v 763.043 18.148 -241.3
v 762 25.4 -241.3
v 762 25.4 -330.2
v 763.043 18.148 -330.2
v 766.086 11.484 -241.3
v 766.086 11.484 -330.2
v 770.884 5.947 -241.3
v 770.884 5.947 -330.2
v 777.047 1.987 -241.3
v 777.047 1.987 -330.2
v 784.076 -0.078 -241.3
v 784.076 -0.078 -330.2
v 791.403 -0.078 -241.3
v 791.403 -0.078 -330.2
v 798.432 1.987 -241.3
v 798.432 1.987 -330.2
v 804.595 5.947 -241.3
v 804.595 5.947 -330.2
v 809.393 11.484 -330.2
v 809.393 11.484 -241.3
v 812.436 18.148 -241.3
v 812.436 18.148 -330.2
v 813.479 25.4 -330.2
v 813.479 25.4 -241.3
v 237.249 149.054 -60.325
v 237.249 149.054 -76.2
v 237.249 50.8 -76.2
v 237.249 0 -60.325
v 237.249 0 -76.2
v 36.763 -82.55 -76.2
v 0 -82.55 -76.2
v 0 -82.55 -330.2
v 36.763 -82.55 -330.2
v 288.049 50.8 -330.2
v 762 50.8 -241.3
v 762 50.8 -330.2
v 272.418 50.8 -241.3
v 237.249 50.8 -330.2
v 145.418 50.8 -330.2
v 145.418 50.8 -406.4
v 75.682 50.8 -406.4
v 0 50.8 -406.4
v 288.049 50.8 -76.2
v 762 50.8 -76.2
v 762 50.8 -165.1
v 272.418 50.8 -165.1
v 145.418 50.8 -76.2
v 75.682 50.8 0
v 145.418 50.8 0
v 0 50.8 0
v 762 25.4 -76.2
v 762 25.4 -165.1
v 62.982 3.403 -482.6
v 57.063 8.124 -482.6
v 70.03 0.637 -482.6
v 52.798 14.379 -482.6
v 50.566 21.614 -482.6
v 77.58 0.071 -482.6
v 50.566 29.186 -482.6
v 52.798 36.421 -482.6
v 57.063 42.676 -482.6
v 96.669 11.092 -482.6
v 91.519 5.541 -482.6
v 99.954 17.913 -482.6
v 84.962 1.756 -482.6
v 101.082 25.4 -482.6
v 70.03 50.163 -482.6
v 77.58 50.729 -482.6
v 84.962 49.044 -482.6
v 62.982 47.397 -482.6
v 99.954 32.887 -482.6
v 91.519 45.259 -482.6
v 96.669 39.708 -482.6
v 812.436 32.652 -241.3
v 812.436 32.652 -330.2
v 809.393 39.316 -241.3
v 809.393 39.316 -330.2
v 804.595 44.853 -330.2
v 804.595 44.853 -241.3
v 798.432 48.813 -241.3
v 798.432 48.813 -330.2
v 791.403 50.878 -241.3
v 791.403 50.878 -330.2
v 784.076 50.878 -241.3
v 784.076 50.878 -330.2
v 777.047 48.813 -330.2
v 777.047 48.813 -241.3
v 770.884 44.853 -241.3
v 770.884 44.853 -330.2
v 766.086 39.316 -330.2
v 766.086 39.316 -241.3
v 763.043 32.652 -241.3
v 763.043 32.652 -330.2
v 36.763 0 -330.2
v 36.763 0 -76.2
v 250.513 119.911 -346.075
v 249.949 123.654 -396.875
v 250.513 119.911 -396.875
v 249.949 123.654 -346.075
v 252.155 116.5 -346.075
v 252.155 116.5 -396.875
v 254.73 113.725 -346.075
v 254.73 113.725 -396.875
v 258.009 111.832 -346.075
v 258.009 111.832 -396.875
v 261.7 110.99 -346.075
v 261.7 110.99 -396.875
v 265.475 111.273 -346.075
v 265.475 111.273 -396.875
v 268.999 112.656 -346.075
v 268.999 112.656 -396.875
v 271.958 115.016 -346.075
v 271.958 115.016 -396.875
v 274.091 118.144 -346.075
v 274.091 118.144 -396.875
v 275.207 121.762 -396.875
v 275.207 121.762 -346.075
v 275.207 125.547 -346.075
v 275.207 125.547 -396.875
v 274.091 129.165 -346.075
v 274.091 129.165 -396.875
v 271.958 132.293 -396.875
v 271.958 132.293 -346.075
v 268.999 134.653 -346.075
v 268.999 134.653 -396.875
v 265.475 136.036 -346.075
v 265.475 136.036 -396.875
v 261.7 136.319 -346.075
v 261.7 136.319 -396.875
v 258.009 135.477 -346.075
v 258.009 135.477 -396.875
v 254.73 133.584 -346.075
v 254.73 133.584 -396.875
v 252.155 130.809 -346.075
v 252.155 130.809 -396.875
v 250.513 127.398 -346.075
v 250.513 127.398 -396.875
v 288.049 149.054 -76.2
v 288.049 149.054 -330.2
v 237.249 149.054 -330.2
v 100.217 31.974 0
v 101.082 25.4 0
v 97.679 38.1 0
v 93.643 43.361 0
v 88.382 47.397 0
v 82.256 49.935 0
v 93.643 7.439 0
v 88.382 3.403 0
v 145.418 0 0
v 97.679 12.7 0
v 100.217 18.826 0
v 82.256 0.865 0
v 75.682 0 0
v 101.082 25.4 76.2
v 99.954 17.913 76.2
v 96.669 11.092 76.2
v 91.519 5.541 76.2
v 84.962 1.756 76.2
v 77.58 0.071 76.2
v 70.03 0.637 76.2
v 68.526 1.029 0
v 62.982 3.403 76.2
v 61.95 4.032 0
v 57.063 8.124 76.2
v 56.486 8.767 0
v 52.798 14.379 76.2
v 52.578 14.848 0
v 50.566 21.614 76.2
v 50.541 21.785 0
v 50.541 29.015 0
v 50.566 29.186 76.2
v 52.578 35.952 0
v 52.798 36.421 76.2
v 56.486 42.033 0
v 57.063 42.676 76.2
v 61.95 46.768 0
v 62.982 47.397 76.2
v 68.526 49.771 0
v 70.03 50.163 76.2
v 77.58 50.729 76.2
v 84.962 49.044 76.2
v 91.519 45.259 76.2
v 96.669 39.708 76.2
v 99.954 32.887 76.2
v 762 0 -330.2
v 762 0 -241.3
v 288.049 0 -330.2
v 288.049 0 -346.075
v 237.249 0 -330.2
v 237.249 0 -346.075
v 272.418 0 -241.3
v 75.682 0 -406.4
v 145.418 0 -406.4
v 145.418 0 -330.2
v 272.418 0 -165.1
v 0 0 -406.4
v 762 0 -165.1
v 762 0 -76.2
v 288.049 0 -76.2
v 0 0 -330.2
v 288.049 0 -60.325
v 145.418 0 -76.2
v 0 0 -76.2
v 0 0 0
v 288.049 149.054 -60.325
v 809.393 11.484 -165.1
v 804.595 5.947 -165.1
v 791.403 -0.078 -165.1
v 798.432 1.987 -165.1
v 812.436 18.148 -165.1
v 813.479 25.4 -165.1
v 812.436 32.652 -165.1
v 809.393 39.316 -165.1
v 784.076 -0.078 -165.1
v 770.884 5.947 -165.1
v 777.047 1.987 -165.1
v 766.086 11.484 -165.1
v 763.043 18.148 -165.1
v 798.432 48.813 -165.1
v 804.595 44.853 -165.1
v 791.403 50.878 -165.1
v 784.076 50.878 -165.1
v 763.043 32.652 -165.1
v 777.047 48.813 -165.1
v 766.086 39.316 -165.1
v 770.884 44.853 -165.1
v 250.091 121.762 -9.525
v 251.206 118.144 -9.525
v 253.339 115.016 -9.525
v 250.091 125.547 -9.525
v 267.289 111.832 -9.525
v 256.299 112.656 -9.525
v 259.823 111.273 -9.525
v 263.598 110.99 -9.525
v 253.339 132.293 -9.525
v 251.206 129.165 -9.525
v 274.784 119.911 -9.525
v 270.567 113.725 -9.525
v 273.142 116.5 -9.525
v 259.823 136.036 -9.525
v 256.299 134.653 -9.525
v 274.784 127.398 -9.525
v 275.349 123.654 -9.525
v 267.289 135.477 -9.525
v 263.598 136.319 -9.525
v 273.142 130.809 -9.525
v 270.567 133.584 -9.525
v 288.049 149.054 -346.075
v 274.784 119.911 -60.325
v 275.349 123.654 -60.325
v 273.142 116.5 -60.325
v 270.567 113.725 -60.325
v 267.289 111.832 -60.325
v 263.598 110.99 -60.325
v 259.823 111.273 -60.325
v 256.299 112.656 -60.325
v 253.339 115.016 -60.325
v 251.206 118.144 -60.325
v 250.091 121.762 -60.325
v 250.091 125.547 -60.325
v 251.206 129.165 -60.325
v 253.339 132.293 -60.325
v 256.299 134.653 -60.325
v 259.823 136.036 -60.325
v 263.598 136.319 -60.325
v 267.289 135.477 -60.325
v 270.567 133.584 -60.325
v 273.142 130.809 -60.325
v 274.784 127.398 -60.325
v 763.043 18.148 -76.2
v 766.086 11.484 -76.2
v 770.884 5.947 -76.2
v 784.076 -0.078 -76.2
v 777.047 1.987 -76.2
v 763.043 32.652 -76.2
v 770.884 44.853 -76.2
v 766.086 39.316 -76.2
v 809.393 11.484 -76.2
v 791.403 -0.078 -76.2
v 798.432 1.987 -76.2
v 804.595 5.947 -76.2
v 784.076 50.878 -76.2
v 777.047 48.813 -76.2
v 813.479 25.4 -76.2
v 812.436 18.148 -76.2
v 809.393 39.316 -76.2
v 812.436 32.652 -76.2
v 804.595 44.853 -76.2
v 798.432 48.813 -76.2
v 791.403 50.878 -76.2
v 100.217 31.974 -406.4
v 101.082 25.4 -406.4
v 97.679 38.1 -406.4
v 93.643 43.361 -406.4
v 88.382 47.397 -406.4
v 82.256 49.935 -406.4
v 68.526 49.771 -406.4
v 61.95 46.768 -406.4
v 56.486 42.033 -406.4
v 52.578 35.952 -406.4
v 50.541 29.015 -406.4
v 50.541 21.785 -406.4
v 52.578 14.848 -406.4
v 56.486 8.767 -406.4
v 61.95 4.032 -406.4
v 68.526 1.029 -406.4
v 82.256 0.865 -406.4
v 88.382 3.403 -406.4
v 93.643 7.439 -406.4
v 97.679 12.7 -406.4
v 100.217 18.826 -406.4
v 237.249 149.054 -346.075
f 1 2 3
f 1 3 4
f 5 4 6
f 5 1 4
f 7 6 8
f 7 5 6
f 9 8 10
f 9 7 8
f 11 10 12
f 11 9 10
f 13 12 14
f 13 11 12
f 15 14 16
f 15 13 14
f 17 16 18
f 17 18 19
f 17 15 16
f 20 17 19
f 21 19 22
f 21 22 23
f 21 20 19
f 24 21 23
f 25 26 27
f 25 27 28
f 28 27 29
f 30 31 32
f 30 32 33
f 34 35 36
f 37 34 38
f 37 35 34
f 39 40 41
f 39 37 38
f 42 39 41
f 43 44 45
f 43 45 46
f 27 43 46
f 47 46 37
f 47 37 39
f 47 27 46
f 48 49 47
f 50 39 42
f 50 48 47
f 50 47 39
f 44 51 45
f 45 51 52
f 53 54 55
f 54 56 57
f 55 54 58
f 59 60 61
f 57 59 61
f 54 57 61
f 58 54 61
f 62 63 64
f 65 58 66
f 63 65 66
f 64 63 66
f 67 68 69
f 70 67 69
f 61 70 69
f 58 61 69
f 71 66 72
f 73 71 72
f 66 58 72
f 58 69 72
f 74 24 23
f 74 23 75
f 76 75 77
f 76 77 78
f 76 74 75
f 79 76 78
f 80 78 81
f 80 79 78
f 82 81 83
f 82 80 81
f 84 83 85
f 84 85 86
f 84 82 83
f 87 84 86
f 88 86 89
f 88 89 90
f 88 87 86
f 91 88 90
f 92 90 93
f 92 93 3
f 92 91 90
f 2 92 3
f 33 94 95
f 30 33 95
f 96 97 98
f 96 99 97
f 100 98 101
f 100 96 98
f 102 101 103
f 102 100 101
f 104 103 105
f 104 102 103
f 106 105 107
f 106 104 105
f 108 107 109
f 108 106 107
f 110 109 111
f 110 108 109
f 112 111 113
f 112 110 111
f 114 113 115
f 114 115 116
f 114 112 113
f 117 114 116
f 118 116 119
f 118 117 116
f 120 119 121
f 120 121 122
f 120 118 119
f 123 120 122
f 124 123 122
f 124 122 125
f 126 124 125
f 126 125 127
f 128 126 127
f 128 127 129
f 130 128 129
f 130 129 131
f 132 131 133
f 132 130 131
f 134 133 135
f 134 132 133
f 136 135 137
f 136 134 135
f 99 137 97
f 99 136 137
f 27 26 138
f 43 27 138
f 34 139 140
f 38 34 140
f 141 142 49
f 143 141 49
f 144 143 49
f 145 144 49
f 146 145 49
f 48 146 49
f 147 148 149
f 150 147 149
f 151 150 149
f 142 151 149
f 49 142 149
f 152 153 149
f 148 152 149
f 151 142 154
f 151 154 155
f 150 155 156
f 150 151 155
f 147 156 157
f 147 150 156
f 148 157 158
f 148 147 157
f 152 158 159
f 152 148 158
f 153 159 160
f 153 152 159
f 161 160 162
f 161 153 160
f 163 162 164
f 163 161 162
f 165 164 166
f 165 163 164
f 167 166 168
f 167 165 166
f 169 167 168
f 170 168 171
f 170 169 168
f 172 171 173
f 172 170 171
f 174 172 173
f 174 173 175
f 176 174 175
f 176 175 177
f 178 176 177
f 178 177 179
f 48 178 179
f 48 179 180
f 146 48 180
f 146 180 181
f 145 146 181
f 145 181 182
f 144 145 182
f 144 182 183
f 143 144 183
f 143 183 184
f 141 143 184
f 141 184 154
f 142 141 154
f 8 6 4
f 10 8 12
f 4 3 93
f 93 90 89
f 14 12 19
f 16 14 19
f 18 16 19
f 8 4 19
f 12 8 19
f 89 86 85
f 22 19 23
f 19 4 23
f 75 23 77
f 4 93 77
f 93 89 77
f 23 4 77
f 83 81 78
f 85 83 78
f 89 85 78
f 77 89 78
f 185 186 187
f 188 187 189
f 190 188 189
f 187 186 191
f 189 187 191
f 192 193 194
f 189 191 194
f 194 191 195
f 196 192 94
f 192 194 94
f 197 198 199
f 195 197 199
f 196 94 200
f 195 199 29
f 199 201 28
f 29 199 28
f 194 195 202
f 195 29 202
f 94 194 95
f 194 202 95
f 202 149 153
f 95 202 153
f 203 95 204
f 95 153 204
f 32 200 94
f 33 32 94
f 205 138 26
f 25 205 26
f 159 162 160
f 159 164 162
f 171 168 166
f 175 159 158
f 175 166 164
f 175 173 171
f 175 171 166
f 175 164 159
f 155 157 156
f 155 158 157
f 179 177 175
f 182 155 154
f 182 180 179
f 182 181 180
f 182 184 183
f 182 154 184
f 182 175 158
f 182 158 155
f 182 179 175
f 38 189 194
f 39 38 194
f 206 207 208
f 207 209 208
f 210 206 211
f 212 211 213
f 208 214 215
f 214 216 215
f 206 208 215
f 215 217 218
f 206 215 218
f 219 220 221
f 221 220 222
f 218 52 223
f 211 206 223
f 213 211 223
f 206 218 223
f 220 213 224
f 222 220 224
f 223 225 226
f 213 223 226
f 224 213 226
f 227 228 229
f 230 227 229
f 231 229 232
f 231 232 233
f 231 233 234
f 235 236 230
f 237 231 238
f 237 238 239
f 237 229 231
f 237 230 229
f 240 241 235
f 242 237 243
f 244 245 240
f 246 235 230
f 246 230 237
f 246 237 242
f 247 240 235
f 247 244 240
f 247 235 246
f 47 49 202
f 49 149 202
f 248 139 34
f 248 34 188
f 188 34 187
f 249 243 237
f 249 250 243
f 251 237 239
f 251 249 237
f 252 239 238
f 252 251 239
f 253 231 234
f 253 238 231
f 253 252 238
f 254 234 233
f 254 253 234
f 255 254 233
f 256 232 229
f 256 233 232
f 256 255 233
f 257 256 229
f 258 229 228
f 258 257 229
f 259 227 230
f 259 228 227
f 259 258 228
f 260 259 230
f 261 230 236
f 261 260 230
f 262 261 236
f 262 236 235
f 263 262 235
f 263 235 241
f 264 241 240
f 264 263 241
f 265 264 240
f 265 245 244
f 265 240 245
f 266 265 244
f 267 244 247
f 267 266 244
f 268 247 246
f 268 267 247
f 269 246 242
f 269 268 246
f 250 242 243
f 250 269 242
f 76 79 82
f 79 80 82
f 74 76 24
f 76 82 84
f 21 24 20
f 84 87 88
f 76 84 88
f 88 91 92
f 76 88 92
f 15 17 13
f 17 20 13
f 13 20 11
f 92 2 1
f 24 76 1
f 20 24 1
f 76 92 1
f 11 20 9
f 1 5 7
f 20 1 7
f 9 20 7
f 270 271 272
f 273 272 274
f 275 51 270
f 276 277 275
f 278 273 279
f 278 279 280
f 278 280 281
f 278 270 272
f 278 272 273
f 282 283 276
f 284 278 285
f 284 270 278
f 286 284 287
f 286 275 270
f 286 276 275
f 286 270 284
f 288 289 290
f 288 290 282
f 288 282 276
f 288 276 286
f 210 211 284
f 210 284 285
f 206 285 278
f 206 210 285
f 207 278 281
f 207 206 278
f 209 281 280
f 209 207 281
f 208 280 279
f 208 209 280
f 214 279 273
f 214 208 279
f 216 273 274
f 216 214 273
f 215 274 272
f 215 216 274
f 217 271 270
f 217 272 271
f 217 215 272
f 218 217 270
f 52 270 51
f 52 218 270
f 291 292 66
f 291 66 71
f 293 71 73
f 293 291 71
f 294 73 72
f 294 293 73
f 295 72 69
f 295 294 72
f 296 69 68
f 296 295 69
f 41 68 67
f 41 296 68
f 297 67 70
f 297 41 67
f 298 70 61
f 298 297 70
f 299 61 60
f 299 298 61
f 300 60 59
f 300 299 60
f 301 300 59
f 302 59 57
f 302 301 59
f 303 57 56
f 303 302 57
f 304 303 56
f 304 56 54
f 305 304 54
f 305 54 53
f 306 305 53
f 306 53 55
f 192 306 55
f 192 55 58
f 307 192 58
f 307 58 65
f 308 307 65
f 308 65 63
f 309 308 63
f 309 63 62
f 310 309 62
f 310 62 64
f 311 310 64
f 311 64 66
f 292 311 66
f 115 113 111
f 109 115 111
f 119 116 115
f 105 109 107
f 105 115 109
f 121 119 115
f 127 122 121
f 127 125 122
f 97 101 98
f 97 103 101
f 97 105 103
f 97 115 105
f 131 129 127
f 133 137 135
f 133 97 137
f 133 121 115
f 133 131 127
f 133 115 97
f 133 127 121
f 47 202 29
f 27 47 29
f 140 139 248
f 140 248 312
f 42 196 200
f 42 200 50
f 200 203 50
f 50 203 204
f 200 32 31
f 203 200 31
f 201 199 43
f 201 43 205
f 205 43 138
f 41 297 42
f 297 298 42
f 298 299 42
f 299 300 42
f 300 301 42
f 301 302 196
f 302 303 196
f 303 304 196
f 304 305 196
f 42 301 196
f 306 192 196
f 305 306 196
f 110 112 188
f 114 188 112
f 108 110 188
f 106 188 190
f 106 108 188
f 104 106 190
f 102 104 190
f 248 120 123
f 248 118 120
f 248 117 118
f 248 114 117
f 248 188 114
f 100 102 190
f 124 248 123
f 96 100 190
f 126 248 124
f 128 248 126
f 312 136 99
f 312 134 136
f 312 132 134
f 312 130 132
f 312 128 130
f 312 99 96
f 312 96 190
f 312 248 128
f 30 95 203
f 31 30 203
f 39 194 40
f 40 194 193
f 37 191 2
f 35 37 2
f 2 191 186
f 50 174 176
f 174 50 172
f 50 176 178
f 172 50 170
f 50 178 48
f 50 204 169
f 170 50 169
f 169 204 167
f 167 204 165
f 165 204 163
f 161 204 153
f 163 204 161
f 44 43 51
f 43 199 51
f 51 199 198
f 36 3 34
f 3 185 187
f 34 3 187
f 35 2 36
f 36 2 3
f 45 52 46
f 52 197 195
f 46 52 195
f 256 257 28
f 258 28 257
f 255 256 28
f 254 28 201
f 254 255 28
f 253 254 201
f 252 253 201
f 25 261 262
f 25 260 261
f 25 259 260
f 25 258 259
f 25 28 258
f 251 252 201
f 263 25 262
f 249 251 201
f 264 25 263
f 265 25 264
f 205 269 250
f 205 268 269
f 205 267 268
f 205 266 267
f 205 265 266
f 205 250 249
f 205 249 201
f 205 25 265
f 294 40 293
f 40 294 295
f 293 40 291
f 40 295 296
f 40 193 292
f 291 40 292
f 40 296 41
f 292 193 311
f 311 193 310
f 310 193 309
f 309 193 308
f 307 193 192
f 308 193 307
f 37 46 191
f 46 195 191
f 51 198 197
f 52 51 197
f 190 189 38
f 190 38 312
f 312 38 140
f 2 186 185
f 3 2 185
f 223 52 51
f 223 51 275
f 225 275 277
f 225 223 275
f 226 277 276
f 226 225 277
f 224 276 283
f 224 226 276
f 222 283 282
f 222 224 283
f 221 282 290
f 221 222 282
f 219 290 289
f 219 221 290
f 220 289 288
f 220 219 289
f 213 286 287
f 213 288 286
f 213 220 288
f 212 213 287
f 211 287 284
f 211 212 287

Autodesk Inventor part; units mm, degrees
ref_plane "YZ Plane" through (0, 0, 0) normal (1, 0, 0) x (0, 1, 0)
ref_plane "XZ Plane" through (0, 0, 0) normal (0, 1, 0) x (-1, 0, 0)
ref_plane "XY Plane" through (0, 0, 0) normal (0, 0, 1) x (1, 0, 0)
sketch "Sketch1" plane through (0, 0, 0) normal (0, 1, 0) x (-1, 0, 0)
  line L0 (0, 0) -> (-145.4185, 0)
  line L1 (-145.4185, -406.4) -> (0, -406.4)
  line L2 (0, -406.4) -> (0, 0)
  line L3 (-145.4185, 0) -> (-145.4185, -76.2)
  line L4 (-145.4185, -76.2) -> (-762, -76.2)
  line L5 (-762, -330.2) -> (-145.4185, -330.2)
  line L6 (-145.4185, -330.2) -> (-145.4185, -406.4)
  line L7 (-762, -165.1) -> (-272.4185, -165.1)
  line L8 (-272.4185, -165.1) -> (-272.4185, -241.3)
  line L9 (-272.4185, -241.3) -> (-762, -241.3)
  line L10 (-762, -76.2) -> (-762, -165.1)
  line L11 (-762, -241.3) -> (-762, -330.2)
  dimension "d0" = 406.4
  dimension "d8" = 76.2
  dimension "d9" = 76.2
  dimension "d10" = 88.9
  dimension "d11" = 88.9
  dimension "d23" = 762
  dimension "d24" = 762
extrude "Extrusion1" add sketch "Sketch1" along normal blind 50.8
sketch "Sketch2" plane through (0, 0, 0) normal (0, 0, 1) x (1, 0, 0)
  circle A0 centre (75.6822, 25.4) radius 25.4
  line L0 (0, 50.8) -> (762, 50.8) projected
  line L1 (0, 0) -> (0, 50.8) projected
  dimension "d40" = 75.6822
extrude "Extrusion2" add sketch "Sketch2" along normal blind 76.2 and the other way blind 482.6
sketch "Sketch3" plane through (145.4185, 0, -76.2) normal (0, 0, 1) x (1, 0, 0)
  line L0 (616.5815, 50.8) -> (127, 50.8) projected
  line L1 (0, 0) -> (616.5815, 0) projected
  line L2 (142.6302, 0) -> (168.0302, 0)
  line L3 (142.6302, 149.0545) -> (91.8302, 149.0545)
  line L4 (91.8302, 149.0545) -> (91.8302, 0)
  line L5 (91.8302, 0) -> (142.6302, 0)
  line L6 (142.6302, 0) -> (142.6302, 149.0545)
  point P0 (-145.4185, 0)
  point P1 (168.0302, 50.8)
  point P2 (117.2302, 0)
extrude "Extrusion3" add sketch "Sketch3" along normal blind 15.875
sketch "Sketch8" plane through (272.4185, 0, -241.3) normal (0, 0, 1) x (1, 0, 0)
  circle A0 centre (515.321, 25.4) radius 25.7395
  point P0 (-272.4185, 0)
extrude "Extrusion8" add sketch "Sketch8" along normal blind 165.1 and the other way blind 88.9
sketch "Sketch4" plane through (762, 0, -330.2) normal (0, 0, -1) x (-1, 0, 0)
  line L0 (448.5513, 0) -> (448.5513, 149.0545) projected
  line L1 (443.5591, 50.8) -> (499.3513, 50.8) projected
  line L2 (448.5513, 149.0545) -> (499.3513, 149.0545) projected
  line L3 (473.9513, 149.0545) -> (499.3513, 149.0545)
  line L4 (499.3513, 0) -> (524.7513, 0)
  line L5 (0, 0) -> (616.5815, 0) projected
  line L6 (448.5513, 0) -> (468.7254, 0)
  line L7 (473.9513, 0) -> (524.7513, 0)
  line L8 (524.7513, 0) -> (524.7513, 149.0545)
  line L9 (524.7513, 149.0545) -> (473.9513, 149.0545)
  line L10 (473.9513, 149.0545) -> (473.9513, 0)
  point P0 (762, 0)
extrude "Extrusion4" add sketch "Sketch4" along normal blind 15.875 contours L10 L2 L9 L8 L4 L5
sketch "Sketch9" plane through (272.4185, 0, -165.1) normal (1, 0, 0) x (0, 0, -1)
  line L0 (76.2, -11.7975) -> (0, -11.7975)
  line L1 (0, -11.7975) -> (0, 62.1226)
  line L2 (0, 62.1226) -> (76.2, 62.1226)
  line L3 (76.2, 62.1226) -> (76.2, -11.7975)
  point P0 (-165.1, 0)
  point P1 (76.2, 0)
  point P2 (0, 50.8)
extrude "Extrusion9" cut sketch "Sketch9" along normal blind 844.55
sketch "Sketch5" plane through (762, 0, -346.075) normal (0, 0, -1) x (-1, 0, 0)
  circle A0 centre (499.3513, 123.6545) radius 12.7
  line L0 (448.5513, 149.0545) -> (499.3513, 149.0545) projected
  line L1 (499.3513, 0) -> (499.3513, 149.0545) projected
  point P0 (762, 0)
  dimension "d25" = 25.4
  dimension "d35" = 25.4
  dimension "d36" = 0
extrude "Extrusion5" add sketch "Sketch5" along normal blind 50.8
sketch "Sketch6" plane through (145.4185, 0, -60.325) normal (0, 0, 1) x (1, 0, 0)
  circle A0 centre (117.2302, 123.6545) radius 12.7
  line L0 (168.0302, 149.0545) -> (117.2302, 149.0545) projected
  line L1 (168.0302, 0) -> (168.0302, 149.0545) projected
  point P0 (-145.4185, 0)
  dimension "d26" = 25.4
  dimension "d38" = 25.4
  dimension "d39" = 50.8
extrude "Extrusion6" add sketch "Sketch6" along normal blind 50.8
sketch "Sketch10" plane through (0, 0, 0) normal (0, -1, 0) x (1, 0, 0)
  line L0 (0, -406.4) -> (0, 0) projected
  line L1 (0, -330.2) -> (36.7628, -330.2)
  line L2 (36.7628, -330.2) -> (36.7628, -76.2)
  line L3 (36.7628, -76.2) -> (0, -76.2)
  line L4 (0, -76.2) -> (0, -330.2)
extrude "Extrusion10" add sketch "Sketch10" along normal blind 82.55
properties part number "elevbase" material "Aluminum 6061"
